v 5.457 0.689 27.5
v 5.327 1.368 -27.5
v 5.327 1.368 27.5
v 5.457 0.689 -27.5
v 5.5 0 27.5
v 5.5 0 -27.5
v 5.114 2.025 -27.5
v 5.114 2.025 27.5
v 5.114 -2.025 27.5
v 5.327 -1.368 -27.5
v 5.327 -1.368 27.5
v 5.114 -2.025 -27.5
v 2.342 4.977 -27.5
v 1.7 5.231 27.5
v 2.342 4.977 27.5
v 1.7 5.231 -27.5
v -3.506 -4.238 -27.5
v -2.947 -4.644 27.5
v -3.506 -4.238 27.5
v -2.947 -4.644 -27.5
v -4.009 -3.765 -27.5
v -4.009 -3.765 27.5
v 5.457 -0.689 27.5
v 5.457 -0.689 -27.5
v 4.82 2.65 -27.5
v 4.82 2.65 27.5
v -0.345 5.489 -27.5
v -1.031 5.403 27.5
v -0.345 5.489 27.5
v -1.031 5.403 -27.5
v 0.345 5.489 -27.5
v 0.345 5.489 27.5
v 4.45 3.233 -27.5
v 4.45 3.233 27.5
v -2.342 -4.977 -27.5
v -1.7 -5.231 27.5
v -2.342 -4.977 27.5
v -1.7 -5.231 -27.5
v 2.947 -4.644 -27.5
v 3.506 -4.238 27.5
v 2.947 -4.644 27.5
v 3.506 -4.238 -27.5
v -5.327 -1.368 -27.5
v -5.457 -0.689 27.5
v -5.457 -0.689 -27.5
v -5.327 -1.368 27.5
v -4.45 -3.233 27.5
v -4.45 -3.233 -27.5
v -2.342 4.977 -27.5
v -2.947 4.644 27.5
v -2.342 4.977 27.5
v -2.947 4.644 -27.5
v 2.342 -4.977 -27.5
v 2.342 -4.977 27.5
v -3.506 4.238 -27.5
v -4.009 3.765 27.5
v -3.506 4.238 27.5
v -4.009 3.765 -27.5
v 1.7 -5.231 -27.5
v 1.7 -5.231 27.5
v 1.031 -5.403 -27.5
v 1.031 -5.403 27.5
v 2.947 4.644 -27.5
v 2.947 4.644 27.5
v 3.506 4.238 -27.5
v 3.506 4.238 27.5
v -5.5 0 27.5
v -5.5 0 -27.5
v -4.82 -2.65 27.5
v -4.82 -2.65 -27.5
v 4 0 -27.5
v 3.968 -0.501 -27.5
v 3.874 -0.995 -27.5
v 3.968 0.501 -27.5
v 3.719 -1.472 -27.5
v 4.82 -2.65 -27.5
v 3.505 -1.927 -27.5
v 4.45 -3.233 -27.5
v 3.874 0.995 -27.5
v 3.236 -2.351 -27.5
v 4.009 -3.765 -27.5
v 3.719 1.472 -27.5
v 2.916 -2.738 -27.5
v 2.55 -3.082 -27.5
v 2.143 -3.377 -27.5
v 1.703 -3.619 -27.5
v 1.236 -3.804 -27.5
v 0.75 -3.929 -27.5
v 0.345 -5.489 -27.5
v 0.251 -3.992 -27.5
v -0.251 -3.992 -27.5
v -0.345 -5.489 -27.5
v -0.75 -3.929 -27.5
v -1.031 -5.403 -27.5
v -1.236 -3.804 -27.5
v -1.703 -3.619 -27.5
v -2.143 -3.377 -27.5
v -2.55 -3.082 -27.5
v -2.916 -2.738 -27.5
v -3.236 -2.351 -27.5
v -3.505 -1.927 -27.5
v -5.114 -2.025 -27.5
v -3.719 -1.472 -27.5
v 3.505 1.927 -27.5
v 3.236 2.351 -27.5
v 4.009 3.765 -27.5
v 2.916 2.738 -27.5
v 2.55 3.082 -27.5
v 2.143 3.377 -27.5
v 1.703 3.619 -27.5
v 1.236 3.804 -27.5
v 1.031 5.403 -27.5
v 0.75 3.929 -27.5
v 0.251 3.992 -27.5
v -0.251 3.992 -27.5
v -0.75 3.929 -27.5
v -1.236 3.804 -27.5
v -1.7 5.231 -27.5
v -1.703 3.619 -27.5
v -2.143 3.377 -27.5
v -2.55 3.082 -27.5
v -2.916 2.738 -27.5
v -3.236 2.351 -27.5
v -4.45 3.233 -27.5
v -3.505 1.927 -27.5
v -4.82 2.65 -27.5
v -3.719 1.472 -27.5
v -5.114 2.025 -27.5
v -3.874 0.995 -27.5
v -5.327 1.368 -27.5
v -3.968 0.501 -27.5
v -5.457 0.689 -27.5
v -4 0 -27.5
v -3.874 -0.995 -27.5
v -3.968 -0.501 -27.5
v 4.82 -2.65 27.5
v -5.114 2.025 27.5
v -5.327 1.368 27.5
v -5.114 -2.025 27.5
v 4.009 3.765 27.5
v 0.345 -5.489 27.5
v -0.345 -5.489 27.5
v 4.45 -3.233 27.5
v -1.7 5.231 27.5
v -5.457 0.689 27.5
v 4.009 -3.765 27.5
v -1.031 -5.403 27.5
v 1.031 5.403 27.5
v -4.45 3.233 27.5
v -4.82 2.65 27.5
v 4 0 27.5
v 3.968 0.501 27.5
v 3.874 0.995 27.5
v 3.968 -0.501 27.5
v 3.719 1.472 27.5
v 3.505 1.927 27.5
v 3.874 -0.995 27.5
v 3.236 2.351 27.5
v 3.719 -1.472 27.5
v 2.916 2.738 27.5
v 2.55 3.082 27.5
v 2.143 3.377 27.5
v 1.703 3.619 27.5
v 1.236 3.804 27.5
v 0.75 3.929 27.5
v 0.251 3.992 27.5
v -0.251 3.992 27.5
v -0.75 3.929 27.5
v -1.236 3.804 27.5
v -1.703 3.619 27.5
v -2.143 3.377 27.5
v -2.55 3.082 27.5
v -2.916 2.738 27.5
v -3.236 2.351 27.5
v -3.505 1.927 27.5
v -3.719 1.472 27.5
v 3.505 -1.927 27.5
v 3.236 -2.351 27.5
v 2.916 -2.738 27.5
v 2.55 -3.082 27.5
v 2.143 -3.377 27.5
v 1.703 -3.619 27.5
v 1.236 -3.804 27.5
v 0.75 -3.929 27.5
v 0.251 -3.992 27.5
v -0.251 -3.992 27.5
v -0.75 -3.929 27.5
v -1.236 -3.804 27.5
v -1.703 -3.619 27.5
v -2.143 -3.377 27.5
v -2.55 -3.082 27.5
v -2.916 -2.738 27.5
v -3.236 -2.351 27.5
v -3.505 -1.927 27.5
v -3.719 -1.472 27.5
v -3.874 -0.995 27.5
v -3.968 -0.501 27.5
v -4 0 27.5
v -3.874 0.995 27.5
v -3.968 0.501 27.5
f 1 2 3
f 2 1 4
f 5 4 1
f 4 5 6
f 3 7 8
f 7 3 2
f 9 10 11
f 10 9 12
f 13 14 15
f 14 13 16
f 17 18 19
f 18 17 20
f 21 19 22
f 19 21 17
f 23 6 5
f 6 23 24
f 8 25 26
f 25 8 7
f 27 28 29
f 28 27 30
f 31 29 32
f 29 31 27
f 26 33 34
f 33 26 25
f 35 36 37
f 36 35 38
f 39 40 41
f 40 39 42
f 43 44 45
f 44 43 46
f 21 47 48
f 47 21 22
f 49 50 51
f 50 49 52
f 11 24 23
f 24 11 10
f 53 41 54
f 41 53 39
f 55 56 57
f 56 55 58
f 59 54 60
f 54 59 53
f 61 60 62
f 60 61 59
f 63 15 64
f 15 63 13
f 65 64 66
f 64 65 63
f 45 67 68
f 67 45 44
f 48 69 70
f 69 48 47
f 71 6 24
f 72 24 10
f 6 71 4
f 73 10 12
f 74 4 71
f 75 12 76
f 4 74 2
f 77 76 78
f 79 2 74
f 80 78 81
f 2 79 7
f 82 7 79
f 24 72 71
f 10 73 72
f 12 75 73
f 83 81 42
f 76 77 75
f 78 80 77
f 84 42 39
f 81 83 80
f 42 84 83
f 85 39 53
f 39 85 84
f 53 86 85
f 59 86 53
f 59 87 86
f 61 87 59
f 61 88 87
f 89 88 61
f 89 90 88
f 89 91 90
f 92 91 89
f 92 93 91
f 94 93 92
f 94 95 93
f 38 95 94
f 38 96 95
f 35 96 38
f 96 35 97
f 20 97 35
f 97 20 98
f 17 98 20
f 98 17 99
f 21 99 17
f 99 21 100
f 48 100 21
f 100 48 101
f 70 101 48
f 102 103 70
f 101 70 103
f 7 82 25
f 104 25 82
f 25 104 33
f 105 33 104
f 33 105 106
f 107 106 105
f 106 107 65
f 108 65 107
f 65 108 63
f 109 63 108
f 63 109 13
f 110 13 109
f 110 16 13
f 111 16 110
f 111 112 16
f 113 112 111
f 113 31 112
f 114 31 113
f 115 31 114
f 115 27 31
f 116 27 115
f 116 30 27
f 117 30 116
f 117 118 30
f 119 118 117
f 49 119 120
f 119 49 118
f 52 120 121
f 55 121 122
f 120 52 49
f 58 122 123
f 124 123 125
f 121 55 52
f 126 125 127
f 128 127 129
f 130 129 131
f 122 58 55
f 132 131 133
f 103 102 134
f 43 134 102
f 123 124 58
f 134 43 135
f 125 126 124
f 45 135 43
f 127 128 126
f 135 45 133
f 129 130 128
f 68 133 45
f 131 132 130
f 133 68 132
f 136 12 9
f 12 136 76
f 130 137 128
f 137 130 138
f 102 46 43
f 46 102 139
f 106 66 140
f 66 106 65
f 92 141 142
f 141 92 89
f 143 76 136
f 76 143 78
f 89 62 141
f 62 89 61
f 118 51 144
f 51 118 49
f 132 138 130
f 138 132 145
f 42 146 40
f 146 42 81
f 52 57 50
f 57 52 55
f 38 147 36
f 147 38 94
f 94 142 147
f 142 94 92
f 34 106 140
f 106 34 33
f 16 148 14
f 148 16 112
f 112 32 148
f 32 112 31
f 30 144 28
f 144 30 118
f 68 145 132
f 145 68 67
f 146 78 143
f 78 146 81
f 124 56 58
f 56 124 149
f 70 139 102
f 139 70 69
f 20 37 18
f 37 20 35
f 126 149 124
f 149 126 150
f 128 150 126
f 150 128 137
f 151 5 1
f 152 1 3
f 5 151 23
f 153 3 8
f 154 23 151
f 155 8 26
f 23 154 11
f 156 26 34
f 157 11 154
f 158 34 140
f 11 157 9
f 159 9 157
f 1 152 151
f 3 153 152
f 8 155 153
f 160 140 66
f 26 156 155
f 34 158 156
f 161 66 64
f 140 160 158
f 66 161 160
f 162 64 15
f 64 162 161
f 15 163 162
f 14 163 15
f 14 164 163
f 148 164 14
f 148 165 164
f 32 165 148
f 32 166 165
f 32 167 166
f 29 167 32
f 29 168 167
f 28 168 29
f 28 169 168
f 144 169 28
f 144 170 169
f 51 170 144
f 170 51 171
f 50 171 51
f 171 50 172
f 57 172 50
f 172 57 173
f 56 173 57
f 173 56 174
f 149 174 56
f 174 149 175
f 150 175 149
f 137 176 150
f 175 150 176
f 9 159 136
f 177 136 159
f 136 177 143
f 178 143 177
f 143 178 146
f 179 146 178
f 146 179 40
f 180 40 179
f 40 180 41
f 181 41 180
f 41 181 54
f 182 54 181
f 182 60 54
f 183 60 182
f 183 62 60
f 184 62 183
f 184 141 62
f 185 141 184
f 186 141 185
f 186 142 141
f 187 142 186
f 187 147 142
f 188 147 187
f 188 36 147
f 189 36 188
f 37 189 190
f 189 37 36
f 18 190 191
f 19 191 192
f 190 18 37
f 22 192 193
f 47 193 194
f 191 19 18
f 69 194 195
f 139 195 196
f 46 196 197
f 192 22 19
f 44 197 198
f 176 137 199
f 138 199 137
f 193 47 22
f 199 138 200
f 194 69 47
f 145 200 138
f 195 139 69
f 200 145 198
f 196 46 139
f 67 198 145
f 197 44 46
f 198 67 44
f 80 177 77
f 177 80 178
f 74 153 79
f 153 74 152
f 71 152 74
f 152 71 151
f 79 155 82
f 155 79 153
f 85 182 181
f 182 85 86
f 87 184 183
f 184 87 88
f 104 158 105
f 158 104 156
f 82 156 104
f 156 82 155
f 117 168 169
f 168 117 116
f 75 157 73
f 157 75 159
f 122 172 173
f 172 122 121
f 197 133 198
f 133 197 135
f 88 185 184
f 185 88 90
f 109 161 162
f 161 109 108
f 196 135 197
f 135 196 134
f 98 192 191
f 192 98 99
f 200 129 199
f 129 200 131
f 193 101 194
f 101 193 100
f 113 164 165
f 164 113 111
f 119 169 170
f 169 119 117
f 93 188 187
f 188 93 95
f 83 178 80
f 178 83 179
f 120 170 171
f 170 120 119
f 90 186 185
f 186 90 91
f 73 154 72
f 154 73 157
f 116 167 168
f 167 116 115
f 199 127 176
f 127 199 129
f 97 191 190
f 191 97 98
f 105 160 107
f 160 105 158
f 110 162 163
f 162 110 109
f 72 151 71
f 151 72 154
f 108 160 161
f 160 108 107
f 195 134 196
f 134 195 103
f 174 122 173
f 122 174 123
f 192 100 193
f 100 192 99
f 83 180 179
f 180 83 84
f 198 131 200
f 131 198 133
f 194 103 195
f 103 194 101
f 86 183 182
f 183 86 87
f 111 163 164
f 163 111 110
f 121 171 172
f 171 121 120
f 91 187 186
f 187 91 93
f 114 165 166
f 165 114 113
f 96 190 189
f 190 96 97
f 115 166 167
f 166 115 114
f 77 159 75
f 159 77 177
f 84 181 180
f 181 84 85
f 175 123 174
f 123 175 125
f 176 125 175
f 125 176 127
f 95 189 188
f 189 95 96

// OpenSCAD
$fn = 50;


difference() {
	union() {
		translate(v = [0, 0, -27.5000000000]) {
			cylinder(h = 55, r = 5.5000000000);
		}
	}
	union() {
		translate(v = [0, 0, -100.0000000000]) {
			cylinder(h = 200, r = 4.0000000000);
		}
	}
}
